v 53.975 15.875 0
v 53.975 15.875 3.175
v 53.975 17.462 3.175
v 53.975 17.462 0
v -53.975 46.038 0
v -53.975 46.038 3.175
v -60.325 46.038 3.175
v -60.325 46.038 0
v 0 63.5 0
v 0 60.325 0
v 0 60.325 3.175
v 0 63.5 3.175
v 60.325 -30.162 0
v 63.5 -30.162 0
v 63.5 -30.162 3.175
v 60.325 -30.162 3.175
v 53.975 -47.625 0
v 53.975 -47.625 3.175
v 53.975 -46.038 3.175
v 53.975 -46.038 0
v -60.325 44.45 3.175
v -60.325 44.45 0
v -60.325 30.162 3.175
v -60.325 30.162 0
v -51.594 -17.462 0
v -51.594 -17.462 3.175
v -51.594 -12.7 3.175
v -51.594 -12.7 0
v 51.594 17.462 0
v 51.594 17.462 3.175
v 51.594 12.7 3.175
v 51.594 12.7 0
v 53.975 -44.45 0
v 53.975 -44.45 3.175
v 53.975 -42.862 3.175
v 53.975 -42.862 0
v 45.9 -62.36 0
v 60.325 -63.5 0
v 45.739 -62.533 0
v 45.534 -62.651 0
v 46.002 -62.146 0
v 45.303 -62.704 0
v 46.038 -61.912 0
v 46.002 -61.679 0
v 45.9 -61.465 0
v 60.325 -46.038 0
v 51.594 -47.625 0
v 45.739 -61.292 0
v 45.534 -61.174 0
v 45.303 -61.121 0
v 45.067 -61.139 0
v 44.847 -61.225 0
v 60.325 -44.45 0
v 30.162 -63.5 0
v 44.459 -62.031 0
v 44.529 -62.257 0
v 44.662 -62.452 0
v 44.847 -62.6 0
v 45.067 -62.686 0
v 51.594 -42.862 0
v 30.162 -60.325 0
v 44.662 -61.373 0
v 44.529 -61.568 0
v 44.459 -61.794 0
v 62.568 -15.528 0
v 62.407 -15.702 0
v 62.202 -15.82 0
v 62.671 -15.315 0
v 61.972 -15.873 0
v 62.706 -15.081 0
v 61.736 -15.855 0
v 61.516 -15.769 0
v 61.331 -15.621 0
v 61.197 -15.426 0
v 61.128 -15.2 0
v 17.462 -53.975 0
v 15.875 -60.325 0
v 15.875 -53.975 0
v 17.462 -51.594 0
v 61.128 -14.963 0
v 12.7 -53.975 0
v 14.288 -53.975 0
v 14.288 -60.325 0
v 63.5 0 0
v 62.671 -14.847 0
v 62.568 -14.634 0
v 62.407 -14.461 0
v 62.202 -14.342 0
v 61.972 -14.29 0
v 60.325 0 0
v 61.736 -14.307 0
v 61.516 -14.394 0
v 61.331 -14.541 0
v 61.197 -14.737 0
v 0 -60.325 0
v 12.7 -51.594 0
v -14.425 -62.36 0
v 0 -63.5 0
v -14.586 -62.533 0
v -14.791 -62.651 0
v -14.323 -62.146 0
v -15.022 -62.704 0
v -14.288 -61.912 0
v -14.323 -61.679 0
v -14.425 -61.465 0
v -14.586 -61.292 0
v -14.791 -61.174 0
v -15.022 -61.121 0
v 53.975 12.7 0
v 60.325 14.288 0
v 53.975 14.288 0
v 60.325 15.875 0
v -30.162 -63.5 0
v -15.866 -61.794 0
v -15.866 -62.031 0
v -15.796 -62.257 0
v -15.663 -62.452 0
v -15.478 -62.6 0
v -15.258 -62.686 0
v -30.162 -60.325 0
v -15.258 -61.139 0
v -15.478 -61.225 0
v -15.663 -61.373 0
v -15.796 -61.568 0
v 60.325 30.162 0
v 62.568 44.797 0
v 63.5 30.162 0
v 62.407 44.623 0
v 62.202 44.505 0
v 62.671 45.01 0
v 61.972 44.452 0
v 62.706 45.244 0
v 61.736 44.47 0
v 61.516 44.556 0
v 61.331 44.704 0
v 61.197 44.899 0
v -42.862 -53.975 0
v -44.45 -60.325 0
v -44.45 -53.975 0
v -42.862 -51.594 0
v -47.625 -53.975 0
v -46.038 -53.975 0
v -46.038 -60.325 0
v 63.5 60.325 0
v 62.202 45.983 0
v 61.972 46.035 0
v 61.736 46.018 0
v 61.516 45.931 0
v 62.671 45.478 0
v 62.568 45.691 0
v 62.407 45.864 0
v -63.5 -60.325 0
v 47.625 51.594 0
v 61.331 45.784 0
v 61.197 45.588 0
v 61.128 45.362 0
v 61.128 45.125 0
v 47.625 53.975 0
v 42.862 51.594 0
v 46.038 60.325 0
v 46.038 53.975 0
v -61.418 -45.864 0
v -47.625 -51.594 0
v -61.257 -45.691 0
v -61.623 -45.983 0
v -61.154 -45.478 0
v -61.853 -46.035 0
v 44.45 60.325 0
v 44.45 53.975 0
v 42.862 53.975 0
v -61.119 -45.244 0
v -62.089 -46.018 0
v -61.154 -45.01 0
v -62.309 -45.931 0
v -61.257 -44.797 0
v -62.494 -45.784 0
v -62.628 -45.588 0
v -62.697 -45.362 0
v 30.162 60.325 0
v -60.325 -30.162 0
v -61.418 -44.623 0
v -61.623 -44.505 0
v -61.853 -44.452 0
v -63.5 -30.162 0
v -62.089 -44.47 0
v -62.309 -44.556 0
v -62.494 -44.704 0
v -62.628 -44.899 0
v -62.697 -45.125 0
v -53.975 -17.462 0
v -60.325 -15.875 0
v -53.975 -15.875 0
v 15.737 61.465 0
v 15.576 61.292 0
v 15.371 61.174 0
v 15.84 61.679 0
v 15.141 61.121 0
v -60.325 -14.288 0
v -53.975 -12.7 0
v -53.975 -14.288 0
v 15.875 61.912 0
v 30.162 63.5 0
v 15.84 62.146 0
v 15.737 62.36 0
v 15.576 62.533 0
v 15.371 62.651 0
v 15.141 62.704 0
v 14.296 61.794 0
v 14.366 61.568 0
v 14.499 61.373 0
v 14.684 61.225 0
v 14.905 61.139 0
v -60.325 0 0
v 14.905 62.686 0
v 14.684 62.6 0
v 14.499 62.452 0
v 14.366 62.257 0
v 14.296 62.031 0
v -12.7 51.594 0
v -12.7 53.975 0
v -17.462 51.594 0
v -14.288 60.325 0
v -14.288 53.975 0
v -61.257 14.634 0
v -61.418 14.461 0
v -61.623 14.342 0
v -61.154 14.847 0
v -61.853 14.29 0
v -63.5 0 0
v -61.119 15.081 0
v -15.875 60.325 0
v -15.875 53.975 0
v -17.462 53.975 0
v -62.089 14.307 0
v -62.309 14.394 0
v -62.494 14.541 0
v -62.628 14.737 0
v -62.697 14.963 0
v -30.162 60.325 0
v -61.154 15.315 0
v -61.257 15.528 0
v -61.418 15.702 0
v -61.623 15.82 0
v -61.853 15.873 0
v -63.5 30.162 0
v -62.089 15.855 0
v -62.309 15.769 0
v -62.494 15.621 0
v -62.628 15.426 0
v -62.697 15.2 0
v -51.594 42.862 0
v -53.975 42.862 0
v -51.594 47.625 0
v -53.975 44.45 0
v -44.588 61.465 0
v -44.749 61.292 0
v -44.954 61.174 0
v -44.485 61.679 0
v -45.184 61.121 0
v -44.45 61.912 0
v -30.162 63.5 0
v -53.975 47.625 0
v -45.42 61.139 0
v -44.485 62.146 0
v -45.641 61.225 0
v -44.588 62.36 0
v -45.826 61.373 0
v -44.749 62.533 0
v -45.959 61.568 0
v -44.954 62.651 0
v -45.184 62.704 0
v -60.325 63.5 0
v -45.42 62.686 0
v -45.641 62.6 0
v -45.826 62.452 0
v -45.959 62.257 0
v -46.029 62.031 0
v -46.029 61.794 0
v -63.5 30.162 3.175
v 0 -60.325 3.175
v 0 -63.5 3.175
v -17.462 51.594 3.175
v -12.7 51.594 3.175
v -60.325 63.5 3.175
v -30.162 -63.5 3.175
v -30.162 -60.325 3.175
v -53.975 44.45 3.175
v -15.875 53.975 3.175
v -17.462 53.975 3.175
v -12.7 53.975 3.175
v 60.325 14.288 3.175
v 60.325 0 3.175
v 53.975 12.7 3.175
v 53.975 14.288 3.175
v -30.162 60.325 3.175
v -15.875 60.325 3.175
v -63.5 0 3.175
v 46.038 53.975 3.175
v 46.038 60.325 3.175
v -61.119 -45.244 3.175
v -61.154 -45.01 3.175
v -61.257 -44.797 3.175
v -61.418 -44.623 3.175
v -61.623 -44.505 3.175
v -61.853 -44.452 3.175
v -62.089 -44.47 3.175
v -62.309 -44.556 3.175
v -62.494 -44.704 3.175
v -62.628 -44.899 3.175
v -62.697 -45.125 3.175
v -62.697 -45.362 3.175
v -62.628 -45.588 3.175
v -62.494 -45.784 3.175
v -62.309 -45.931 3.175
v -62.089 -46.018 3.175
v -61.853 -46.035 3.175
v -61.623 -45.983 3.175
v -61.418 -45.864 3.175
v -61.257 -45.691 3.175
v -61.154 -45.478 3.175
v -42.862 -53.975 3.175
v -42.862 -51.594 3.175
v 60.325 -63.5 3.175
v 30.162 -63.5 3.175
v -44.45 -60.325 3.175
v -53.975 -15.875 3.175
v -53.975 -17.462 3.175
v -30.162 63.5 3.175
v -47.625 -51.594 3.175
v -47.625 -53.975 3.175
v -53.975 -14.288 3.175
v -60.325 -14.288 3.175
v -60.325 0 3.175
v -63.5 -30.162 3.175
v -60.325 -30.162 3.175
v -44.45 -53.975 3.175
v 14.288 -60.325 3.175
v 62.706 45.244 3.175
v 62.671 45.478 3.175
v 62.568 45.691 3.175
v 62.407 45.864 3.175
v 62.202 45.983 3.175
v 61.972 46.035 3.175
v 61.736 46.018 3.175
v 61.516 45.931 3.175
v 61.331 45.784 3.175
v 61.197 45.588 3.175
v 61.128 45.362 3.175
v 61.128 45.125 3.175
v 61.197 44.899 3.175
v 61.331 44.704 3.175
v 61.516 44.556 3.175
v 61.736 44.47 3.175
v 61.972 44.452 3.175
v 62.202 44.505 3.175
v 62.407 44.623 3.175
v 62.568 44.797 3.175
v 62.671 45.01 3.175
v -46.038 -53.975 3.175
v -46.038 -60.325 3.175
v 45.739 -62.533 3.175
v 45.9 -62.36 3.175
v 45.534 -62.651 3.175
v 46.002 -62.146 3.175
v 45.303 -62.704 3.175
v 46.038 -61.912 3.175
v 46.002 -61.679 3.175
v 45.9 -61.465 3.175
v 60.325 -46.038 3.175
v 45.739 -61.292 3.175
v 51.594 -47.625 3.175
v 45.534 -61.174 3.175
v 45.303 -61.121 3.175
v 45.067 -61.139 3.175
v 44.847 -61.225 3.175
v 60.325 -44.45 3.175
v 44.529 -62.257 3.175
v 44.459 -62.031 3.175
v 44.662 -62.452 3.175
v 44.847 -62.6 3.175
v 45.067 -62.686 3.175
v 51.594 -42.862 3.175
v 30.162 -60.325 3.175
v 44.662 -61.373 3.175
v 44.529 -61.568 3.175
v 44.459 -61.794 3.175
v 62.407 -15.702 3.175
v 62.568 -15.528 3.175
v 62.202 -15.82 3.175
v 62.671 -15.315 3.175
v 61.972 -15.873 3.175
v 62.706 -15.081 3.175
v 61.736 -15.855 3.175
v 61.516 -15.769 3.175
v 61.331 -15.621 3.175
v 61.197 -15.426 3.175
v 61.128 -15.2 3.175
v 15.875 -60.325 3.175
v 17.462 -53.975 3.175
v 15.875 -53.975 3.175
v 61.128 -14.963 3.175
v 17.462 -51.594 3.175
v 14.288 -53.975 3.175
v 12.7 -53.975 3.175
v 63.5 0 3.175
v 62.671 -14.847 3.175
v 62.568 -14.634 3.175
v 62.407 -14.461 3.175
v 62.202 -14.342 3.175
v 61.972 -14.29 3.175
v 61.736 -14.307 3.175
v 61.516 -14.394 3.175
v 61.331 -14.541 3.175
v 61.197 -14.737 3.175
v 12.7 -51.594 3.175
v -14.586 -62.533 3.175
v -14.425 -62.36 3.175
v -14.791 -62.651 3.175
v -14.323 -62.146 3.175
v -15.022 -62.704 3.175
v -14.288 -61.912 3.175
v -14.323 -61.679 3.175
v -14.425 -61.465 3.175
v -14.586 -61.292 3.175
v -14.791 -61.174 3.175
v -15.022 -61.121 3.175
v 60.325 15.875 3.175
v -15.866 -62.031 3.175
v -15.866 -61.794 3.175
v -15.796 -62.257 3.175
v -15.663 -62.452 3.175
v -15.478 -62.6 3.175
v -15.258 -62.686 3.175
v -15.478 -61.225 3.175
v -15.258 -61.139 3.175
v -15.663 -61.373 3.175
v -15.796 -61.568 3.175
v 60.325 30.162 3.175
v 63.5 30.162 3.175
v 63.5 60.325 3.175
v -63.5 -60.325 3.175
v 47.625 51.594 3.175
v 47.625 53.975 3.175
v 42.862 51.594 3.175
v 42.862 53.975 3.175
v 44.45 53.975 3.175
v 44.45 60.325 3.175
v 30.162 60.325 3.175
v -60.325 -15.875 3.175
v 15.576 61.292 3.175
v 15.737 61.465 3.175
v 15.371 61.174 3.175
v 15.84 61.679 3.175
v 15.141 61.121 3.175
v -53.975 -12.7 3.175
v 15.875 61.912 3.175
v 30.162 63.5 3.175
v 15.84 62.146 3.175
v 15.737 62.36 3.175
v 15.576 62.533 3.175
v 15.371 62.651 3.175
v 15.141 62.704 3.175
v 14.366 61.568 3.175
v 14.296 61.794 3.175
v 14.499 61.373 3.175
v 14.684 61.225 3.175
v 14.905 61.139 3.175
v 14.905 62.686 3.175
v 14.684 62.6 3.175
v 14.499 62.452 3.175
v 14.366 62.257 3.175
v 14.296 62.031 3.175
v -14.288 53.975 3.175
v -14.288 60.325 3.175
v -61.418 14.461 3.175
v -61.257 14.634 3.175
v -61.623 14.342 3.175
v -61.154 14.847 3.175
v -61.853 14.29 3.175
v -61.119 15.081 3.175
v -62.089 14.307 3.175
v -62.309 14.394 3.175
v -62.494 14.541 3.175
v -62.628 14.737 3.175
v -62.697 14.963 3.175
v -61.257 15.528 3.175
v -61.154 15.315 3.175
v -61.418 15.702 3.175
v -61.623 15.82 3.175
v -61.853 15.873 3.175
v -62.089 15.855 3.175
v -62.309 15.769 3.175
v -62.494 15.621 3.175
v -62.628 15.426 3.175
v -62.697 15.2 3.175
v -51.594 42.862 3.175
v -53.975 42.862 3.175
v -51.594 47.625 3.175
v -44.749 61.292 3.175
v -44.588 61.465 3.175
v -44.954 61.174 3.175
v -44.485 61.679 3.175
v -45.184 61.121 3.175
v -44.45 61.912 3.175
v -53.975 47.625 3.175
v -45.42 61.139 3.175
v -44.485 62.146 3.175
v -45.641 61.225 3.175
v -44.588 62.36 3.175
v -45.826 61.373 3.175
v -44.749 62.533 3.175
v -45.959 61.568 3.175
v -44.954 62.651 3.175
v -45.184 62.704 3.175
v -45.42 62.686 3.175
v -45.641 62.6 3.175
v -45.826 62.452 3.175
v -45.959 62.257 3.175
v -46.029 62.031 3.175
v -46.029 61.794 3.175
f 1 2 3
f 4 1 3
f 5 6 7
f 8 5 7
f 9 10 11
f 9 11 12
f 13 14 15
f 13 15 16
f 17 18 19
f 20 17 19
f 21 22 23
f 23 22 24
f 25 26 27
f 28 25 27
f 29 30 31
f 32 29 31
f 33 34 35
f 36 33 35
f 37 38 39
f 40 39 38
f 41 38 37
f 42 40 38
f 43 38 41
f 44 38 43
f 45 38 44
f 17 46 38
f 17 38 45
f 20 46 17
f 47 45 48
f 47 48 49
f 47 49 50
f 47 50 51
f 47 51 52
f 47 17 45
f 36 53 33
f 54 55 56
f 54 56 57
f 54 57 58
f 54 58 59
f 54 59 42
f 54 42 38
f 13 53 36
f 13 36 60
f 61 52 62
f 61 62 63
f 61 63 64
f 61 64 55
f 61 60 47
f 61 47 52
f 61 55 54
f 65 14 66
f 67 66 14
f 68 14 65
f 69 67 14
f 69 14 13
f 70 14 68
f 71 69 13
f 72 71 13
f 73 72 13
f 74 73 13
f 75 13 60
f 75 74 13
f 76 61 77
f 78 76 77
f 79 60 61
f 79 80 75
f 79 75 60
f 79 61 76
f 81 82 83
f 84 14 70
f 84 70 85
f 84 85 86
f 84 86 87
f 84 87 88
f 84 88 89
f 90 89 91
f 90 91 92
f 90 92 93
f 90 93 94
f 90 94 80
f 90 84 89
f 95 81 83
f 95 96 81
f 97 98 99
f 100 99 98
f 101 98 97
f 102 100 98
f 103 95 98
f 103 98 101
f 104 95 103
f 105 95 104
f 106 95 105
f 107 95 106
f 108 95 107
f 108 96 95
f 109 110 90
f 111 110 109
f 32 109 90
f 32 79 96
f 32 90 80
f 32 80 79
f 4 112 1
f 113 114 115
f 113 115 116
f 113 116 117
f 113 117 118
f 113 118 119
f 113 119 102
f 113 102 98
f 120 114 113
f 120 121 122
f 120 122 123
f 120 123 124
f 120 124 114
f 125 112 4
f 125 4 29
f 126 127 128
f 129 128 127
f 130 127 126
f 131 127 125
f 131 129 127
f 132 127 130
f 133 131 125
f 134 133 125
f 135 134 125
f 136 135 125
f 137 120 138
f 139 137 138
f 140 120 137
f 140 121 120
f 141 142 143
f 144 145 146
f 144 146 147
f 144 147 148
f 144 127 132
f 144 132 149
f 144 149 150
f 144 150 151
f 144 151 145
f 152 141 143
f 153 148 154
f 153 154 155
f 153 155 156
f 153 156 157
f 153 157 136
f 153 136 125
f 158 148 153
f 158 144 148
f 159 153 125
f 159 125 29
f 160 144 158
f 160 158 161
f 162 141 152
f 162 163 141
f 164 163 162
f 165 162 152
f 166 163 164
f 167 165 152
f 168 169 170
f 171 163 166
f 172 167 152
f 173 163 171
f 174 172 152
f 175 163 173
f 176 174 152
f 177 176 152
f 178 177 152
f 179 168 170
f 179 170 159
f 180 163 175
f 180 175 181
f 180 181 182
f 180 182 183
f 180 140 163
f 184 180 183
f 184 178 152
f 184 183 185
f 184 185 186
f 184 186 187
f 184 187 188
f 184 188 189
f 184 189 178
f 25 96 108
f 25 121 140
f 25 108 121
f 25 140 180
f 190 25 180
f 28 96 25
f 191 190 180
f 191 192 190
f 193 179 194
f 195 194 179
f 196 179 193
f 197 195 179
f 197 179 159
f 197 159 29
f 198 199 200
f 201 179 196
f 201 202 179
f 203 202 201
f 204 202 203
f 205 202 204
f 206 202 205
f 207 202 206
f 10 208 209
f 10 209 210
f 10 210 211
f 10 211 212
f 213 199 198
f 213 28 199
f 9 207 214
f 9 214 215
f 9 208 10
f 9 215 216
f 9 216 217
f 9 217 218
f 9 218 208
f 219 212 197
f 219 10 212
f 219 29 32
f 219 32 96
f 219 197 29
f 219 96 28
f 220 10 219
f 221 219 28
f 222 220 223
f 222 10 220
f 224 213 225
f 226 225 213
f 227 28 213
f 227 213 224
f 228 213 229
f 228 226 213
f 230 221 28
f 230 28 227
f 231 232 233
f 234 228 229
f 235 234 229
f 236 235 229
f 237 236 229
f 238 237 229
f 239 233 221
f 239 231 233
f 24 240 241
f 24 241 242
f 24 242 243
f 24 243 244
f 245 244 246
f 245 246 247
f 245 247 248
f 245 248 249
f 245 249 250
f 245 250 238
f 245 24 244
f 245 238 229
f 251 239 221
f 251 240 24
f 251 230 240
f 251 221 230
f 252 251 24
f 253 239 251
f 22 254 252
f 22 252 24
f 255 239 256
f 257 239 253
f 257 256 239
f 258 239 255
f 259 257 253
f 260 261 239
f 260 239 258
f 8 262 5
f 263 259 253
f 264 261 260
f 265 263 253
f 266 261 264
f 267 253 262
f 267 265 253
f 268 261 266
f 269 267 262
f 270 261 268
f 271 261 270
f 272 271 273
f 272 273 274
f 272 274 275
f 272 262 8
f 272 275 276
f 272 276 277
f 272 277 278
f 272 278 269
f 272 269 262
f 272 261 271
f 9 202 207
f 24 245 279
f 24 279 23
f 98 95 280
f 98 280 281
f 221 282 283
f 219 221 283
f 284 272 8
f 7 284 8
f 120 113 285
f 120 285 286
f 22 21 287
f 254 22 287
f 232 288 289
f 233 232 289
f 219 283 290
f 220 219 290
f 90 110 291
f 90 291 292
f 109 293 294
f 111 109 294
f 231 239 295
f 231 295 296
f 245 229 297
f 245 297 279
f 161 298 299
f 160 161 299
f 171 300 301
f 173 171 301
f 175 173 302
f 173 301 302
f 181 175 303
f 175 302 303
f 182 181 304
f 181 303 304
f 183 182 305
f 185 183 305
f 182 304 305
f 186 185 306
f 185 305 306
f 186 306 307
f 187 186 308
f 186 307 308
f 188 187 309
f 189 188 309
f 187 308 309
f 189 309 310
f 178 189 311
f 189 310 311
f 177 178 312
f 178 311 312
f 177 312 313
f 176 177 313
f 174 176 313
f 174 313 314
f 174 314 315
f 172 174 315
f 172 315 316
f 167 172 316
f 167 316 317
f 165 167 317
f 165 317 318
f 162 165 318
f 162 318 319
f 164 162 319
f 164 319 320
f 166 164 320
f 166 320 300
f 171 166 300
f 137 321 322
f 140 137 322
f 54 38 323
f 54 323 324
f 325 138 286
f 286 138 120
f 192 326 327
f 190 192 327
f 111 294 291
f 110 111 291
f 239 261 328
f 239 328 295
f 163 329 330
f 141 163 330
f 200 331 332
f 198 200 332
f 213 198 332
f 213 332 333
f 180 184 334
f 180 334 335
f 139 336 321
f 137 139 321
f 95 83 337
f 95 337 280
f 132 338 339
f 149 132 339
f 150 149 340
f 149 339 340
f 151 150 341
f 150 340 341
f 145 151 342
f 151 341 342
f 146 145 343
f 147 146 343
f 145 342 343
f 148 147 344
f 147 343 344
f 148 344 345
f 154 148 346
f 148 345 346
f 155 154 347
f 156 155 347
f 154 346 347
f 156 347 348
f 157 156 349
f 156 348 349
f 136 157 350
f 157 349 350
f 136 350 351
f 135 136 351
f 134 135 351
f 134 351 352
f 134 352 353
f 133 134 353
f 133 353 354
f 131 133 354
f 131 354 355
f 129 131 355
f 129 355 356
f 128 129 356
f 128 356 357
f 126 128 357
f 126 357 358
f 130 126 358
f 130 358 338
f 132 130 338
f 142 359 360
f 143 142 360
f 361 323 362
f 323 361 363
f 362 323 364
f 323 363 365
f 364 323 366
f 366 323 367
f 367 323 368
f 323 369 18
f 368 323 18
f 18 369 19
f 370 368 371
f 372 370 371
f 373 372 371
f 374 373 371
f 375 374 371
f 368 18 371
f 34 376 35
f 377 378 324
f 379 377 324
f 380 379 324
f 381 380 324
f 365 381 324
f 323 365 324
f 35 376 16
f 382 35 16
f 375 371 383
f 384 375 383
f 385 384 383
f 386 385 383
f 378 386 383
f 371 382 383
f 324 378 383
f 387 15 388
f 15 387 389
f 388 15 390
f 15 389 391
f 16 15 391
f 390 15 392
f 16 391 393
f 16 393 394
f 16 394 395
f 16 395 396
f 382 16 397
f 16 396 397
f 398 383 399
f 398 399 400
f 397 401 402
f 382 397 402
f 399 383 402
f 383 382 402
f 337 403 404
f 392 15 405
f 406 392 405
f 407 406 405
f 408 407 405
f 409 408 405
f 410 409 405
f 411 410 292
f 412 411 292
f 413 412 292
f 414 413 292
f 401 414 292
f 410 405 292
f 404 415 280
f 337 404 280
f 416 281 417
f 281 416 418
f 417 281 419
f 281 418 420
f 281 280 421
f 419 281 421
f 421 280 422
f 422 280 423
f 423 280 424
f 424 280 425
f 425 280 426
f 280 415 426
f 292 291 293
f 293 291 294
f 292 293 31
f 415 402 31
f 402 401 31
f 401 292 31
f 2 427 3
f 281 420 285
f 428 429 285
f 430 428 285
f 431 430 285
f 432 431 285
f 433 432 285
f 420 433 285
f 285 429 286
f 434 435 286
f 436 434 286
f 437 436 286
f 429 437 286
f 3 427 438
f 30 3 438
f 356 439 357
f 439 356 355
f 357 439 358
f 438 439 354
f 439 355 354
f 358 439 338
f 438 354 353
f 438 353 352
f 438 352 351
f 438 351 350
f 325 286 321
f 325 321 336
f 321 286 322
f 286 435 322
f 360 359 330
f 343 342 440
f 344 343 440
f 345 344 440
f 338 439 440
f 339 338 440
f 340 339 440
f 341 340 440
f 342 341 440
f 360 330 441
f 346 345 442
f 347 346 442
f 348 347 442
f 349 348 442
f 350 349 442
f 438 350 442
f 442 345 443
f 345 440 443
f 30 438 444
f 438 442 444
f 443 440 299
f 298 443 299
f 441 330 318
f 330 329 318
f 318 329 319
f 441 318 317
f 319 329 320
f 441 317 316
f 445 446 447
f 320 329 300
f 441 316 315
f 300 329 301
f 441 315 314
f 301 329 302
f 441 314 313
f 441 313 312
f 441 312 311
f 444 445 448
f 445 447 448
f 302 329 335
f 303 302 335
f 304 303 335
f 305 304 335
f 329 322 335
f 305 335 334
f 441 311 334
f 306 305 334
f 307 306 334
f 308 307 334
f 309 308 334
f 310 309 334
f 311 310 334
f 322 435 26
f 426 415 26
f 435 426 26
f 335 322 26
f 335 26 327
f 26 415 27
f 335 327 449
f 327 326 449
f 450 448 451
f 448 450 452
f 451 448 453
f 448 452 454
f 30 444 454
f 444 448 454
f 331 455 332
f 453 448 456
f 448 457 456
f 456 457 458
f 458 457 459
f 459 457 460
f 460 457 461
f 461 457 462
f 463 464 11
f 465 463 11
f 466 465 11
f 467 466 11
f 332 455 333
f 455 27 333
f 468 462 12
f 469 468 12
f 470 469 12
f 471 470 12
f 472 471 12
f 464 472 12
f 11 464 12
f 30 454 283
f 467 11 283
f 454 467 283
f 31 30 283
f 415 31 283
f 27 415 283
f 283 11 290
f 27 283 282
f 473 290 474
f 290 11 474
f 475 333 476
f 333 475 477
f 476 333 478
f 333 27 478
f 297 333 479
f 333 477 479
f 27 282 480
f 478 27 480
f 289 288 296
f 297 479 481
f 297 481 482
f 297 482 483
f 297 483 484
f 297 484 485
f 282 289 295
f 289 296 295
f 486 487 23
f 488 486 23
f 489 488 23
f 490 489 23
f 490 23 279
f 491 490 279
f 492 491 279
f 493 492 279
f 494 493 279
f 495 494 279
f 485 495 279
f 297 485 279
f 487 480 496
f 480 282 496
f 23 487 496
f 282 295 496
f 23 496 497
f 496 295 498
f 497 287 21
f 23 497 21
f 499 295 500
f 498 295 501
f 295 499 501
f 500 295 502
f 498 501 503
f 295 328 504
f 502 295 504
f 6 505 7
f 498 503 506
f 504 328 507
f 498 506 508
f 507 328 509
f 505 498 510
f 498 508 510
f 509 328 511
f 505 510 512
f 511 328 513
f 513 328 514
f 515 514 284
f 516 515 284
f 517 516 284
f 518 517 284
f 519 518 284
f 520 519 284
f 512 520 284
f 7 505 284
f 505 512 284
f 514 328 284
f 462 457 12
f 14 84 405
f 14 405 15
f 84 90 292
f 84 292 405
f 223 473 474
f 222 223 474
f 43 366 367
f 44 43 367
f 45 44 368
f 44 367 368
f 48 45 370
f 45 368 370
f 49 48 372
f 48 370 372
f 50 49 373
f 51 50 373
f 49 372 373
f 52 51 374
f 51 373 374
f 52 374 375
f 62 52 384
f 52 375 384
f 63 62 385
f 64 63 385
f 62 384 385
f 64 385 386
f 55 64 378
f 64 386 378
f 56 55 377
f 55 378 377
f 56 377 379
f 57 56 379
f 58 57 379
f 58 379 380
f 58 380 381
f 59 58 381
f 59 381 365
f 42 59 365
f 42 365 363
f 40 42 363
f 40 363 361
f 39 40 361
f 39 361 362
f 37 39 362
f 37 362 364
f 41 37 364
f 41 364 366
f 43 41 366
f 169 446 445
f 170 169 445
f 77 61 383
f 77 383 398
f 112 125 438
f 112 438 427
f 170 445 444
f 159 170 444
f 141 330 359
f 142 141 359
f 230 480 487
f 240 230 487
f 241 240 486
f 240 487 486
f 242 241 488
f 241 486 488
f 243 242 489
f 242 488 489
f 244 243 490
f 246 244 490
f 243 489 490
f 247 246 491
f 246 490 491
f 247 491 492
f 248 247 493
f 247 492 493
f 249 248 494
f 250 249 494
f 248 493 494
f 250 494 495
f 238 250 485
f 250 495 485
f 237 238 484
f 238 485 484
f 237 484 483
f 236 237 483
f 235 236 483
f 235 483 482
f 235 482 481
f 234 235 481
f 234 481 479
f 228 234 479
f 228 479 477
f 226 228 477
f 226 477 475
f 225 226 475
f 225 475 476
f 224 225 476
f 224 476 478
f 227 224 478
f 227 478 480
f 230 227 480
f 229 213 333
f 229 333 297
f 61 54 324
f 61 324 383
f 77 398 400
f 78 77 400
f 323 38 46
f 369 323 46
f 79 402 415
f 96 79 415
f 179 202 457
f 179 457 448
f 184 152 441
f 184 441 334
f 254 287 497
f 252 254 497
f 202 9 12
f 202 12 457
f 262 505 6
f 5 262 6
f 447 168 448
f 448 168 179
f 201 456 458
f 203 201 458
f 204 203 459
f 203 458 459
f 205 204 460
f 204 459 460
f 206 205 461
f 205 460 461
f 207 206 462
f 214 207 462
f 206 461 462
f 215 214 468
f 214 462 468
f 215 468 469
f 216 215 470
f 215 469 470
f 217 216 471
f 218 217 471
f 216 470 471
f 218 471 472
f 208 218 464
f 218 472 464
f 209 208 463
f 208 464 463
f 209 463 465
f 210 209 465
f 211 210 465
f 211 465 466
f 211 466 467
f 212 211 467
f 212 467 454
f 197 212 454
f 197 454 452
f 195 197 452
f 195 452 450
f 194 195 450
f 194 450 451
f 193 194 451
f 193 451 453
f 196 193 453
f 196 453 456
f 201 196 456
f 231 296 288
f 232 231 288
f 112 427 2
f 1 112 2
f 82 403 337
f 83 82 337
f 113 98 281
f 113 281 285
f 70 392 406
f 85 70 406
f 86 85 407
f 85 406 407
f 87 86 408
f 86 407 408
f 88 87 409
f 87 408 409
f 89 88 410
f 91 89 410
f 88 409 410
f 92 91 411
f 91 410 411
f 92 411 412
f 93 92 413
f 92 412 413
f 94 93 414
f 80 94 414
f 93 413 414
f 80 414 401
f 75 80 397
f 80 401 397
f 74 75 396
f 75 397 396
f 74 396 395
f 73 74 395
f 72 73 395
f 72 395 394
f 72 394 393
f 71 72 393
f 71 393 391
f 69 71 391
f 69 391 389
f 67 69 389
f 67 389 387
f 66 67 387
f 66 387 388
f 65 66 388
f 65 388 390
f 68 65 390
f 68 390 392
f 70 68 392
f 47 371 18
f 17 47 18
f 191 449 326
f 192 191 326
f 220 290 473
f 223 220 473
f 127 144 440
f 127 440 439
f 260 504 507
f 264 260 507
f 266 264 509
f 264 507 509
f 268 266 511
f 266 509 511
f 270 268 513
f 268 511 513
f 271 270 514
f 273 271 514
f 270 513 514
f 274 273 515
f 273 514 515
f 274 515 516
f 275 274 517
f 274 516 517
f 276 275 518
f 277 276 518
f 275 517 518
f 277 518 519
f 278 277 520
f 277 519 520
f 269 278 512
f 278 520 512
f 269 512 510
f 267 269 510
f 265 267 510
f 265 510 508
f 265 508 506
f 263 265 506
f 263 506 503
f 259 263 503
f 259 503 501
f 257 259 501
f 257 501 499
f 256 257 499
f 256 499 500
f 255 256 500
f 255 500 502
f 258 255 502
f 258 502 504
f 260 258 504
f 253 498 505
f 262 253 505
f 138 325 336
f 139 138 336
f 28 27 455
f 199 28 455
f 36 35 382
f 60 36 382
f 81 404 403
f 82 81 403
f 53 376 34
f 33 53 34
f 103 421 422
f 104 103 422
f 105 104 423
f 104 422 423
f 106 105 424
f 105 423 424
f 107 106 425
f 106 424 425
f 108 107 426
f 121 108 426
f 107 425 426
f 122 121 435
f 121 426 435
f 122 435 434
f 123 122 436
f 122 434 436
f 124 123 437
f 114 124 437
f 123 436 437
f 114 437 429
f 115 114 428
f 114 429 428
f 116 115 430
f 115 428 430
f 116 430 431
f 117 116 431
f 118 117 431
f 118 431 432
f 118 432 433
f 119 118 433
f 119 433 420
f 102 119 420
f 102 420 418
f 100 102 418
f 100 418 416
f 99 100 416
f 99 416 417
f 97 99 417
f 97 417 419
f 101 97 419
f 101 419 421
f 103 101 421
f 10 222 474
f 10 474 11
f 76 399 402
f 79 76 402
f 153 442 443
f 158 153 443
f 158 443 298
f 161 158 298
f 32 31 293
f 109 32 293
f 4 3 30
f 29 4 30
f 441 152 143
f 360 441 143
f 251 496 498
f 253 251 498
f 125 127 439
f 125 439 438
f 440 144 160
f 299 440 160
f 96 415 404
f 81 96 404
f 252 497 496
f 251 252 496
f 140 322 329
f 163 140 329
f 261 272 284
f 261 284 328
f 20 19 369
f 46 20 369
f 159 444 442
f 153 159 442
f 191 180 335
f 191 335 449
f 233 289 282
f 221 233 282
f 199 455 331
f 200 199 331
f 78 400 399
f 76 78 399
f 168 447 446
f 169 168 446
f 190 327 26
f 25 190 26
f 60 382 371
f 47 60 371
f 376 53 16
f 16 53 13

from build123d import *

# Parameters (mm, degrees)
BOSS_EXTRUDE1_DEPTH = 3.175
SKETCH2_R           = 0.79375
CUT_EXTRUDE1_DEPTH  = 90.858670283


with BuildPart() as part:
    # Sketch1 → Boss-Extrude1 (new body)
    with BuildSketch(Plane.XY):
        Polygon((-60.325, 60.325), (-60.325, 63.5), (-30.1625, 63.5), (-30.1625, 60.325), (0, 60.325), (0, 63.5), (30.1625, 63.5), (30.1625, 60.325), (60.325, 60.325), (63.5, 60.325), (63.5, 30.1625), (60.325, 30.1625), (60.325, 0), (63.5, 0), (63.5, -30.1625), (60.325, -30.1625), (60.325, -60.325), (60.325, -63.5), (30.1625, -63.5), (30.1625, -60.325), (0, -60.325), (0, -63.5), (-30.1625, -63.5), (-30.1625, -60.325), (-60.325, -60.325), (-63.5, -60.325), (-63.5, -30.1625), (-60.325, -30.1625), (-60.325, 0), (-63.5, 0), (-63.5, 30.1625), (-60.325, 30.1625), align=None)
    extrude(amount=BOSS_EXTRUDE1_DEPTH)

    # Sketch2 → Cut-Extrude1 (cut, through all)
    with BuildSketch(Plane.XY.offset(3.175)):
        Polygon((-14.2875, 53.975), (-14.2875, 60.325), (-15.875, 60.325), (-15.875, 53.975), (-17.4625, 53.975), (-17.4625, 51.59375), (-12.7, 51.59375), (-12.7, 53.975), align=None)
        Polygon((-53.975, 46.0375), (-60.325, 46.0375), (-60.325, 44.45), (-53.975, 44.45), (-53.975, 42.8625), (-51.59375, 42.8625), (-51.59375, 47.625), (-53.975, 47.625), align=None)
        Polygon((46.0375, 60.325), (44.45, 60.325), (44.45, 53.975), (42.8625, 53.975), (42.8625, 51.59375), (47.625, 51.59375), (47.625, 53.975), (46.0375, 53.975), align=None)
        Polygon((60.325, 14.2875), (60.325, 15.875), (53.975, 15.875), (53.975, 17.4625), (51.59375, 17.4625), (51.59375, 12.7), (53.975, 12.7), (53.975, 14.2875), align=None)
        Polygon((-53.975, -14.2875), (-60.325, -14.2875), (-60.325, -15.875), (-53.975, -15.875), (-53.975, -17.4625), (-51.59375, -17.4625), (-51.59375, -12.7), (-53.975, -12.7), align=None)
        Polygon((-46.0375, -53.975), (-46.0375, -60.325), (-44.45, -60.325), (-44.45, -53.975), (-42.8625, -53.975), (-42.8625, -51.59375), (-47.625, -51.59375), (-47.625, -53.975), align=None)
        Polygon((60.325, -46.0375), (60.325, -44.45), (53.975, -44.45), (53.975, -42.8625), (51.59375, -42.8625), (51.59375, -47.625), (53.975, -47.625), (53.975, -46.0375), align=None)
        Polygon((14.2875, -60.325), (15.875, -60.325), (15.875, -53.975), (17.4625, -53.975), (17.4625, -51.59375), (12.7, -51.59375), (12.7, -53.975), (14.2875, -53.975), align=None)
        with Locations((-45.24375, 61.9125)):
            Circle(SKETCH2_R)
        with Locations((15.08125, 61.9125)):
            Circle(SKETCH2_R)
        with Locations((61.9125, 45.24375)):
            Circle(SKETCH2_R)
        with Locations((61.9125, -15.08125)):
            Circle(SKETCH2_R)
        with Locations((45.24375, -61.9125)):
            Circle(SKETCH2_R)
        with Locations((-15.08125, -61.9125)):
            Circle(SKETCH2_R)
        with Locations((-61.9125, -45.24375)):
            Circle(SKETCH2_R)
        with Locations((-61.9125, 15.08125)):
            Circle(SKETCH2_R)
    extrude(amount=-CUT_EXTRUDE1_DEPTH, mode=Mode.SUBTRACT)


solid = part.part
